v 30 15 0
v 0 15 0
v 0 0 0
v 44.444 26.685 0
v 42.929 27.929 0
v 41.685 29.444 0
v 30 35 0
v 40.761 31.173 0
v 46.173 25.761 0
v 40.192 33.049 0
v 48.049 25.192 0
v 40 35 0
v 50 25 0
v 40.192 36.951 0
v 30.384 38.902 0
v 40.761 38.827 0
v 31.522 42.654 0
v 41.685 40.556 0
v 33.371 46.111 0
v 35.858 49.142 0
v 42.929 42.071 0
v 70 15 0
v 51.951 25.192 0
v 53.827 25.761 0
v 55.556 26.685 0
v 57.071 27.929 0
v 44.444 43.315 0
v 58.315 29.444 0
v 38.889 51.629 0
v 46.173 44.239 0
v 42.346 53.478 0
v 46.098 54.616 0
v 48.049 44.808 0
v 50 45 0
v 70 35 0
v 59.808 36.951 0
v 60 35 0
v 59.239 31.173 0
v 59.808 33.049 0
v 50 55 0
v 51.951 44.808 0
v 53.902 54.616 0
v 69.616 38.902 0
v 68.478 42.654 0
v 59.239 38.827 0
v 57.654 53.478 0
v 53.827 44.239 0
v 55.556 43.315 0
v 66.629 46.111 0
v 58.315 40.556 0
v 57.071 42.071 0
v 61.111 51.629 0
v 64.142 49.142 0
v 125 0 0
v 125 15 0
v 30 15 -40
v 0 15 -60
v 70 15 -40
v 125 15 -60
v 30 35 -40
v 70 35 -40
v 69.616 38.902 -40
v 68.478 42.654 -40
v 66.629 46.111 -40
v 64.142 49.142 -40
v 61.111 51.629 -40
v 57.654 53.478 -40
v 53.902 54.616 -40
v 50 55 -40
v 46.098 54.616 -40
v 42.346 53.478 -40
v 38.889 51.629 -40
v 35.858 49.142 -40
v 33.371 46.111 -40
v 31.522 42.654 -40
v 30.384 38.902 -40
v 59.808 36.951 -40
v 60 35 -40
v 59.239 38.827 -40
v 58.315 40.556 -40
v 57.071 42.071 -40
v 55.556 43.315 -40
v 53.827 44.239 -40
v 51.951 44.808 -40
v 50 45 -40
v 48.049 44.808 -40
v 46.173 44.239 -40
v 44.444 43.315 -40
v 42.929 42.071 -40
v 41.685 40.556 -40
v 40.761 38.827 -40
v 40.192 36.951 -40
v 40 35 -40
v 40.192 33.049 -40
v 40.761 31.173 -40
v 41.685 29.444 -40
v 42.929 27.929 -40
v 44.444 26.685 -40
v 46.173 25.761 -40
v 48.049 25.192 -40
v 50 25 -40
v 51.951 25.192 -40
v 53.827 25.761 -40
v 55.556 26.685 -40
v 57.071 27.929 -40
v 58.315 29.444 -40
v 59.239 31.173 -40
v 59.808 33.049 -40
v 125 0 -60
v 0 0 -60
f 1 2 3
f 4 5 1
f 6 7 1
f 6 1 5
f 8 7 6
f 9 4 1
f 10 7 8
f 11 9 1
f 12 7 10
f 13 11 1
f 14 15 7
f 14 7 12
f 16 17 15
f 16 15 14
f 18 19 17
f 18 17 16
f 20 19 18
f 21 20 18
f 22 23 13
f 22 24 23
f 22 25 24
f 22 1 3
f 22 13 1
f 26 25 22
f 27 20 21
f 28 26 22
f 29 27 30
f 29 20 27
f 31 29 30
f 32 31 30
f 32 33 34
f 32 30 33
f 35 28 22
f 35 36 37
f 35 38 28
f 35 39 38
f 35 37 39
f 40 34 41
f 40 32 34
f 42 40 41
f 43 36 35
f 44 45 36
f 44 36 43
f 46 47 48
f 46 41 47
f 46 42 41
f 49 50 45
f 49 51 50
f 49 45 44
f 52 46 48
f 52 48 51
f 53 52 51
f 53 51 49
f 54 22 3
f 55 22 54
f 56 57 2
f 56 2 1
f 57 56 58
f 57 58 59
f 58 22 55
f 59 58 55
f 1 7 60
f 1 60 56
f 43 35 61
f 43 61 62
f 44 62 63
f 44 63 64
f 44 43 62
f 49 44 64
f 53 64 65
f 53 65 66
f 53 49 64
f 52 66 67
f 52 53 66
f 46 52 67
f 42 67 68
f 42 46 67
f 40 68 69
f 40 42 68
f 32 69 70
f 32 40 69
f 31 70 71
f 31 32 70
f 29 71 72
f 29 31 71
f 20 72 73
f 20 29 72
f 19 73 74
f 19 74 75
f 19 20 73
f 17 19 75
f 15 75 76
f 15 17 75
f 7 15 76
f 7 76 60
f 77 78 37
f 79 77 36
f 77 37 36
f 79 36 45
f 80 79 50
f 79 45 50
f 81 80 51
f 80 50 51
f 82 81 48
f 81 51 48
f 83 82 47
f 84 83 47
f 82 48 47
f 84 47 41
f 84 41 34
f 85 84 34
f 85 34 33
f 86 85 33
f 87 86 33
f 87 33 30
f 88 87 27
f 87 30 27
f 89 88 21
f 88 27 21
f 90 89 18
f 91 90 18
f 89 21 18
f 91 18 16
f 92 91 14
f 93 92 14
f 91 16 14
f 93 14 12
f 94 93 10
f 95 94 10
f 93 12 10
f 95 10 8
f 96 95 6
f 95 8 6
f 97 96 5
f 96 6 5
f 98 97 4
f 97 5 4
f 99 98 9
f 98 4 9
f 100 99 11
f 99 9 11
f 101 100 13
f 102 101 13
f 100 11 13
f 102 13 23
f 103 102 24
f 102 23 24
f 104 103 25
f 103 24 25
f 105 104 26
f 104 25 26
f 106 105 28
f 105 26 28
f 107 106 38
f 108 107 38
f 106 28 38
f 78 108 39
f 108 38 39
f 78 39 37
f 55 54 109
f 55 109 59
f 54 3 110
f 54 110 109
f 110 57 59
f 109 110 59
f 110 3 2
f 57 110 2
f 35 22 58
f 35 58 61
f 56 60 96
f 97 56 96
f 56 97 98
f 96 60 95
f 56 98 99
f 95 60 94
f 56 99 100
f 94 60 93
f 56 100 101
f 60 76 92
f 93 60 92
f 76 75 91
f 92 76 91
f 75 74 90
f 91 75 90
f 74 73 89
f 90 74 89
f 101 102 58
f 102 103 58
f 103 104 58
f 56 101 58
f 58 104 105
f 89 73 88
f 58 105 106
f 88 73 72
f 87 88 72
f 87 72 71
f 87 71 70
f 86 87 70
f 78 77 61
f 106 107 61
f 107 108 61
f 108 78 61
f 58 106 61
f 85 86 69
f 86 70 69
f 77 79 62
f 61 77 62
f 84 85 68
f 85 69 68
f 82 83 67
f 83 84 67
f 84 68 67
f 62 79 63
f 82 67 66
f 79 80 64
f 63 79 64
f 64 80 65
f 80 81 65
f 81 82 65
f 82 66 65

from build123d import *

# Parameters (mm, degrees)
BOSS_EXTRUDE1_DEPTH = 60
SKETCH1_3_R         = 10
BOSS_EXTRUDE2_DEPTH = 40


with BuildPart() as part:
    # Sketch1 → Boss-Extrude1 (new body)
    with BuildSketch(Plane.XY):
        Polygon((70, 15), (30, 15), (0, 15), (0, 0), (125, 0), (125, 15), align=None)
    extrude(amount=-BOSS_EXTRUDE1_DEPTH)

    # Sketch1<3> → Boss-Extrude2 (add)
    with BuildSketch(Plane.XY):
        with BuildLine():
            Line((30, 35), (30, 15))
            Line((30, 15), (70, 15))
            Line((70, 15), (70, 35))
            ThreePointArc((70, 35), (50, 55), (30, 35))
        make_face()
        with Locations((50, 35)):
            Circle(SKETCH1_3_R, mode=Mode.SUBTRACT)
    extrude(amount=-BOSS_EXTRUDE2_DEPTH)


solid = part.part
